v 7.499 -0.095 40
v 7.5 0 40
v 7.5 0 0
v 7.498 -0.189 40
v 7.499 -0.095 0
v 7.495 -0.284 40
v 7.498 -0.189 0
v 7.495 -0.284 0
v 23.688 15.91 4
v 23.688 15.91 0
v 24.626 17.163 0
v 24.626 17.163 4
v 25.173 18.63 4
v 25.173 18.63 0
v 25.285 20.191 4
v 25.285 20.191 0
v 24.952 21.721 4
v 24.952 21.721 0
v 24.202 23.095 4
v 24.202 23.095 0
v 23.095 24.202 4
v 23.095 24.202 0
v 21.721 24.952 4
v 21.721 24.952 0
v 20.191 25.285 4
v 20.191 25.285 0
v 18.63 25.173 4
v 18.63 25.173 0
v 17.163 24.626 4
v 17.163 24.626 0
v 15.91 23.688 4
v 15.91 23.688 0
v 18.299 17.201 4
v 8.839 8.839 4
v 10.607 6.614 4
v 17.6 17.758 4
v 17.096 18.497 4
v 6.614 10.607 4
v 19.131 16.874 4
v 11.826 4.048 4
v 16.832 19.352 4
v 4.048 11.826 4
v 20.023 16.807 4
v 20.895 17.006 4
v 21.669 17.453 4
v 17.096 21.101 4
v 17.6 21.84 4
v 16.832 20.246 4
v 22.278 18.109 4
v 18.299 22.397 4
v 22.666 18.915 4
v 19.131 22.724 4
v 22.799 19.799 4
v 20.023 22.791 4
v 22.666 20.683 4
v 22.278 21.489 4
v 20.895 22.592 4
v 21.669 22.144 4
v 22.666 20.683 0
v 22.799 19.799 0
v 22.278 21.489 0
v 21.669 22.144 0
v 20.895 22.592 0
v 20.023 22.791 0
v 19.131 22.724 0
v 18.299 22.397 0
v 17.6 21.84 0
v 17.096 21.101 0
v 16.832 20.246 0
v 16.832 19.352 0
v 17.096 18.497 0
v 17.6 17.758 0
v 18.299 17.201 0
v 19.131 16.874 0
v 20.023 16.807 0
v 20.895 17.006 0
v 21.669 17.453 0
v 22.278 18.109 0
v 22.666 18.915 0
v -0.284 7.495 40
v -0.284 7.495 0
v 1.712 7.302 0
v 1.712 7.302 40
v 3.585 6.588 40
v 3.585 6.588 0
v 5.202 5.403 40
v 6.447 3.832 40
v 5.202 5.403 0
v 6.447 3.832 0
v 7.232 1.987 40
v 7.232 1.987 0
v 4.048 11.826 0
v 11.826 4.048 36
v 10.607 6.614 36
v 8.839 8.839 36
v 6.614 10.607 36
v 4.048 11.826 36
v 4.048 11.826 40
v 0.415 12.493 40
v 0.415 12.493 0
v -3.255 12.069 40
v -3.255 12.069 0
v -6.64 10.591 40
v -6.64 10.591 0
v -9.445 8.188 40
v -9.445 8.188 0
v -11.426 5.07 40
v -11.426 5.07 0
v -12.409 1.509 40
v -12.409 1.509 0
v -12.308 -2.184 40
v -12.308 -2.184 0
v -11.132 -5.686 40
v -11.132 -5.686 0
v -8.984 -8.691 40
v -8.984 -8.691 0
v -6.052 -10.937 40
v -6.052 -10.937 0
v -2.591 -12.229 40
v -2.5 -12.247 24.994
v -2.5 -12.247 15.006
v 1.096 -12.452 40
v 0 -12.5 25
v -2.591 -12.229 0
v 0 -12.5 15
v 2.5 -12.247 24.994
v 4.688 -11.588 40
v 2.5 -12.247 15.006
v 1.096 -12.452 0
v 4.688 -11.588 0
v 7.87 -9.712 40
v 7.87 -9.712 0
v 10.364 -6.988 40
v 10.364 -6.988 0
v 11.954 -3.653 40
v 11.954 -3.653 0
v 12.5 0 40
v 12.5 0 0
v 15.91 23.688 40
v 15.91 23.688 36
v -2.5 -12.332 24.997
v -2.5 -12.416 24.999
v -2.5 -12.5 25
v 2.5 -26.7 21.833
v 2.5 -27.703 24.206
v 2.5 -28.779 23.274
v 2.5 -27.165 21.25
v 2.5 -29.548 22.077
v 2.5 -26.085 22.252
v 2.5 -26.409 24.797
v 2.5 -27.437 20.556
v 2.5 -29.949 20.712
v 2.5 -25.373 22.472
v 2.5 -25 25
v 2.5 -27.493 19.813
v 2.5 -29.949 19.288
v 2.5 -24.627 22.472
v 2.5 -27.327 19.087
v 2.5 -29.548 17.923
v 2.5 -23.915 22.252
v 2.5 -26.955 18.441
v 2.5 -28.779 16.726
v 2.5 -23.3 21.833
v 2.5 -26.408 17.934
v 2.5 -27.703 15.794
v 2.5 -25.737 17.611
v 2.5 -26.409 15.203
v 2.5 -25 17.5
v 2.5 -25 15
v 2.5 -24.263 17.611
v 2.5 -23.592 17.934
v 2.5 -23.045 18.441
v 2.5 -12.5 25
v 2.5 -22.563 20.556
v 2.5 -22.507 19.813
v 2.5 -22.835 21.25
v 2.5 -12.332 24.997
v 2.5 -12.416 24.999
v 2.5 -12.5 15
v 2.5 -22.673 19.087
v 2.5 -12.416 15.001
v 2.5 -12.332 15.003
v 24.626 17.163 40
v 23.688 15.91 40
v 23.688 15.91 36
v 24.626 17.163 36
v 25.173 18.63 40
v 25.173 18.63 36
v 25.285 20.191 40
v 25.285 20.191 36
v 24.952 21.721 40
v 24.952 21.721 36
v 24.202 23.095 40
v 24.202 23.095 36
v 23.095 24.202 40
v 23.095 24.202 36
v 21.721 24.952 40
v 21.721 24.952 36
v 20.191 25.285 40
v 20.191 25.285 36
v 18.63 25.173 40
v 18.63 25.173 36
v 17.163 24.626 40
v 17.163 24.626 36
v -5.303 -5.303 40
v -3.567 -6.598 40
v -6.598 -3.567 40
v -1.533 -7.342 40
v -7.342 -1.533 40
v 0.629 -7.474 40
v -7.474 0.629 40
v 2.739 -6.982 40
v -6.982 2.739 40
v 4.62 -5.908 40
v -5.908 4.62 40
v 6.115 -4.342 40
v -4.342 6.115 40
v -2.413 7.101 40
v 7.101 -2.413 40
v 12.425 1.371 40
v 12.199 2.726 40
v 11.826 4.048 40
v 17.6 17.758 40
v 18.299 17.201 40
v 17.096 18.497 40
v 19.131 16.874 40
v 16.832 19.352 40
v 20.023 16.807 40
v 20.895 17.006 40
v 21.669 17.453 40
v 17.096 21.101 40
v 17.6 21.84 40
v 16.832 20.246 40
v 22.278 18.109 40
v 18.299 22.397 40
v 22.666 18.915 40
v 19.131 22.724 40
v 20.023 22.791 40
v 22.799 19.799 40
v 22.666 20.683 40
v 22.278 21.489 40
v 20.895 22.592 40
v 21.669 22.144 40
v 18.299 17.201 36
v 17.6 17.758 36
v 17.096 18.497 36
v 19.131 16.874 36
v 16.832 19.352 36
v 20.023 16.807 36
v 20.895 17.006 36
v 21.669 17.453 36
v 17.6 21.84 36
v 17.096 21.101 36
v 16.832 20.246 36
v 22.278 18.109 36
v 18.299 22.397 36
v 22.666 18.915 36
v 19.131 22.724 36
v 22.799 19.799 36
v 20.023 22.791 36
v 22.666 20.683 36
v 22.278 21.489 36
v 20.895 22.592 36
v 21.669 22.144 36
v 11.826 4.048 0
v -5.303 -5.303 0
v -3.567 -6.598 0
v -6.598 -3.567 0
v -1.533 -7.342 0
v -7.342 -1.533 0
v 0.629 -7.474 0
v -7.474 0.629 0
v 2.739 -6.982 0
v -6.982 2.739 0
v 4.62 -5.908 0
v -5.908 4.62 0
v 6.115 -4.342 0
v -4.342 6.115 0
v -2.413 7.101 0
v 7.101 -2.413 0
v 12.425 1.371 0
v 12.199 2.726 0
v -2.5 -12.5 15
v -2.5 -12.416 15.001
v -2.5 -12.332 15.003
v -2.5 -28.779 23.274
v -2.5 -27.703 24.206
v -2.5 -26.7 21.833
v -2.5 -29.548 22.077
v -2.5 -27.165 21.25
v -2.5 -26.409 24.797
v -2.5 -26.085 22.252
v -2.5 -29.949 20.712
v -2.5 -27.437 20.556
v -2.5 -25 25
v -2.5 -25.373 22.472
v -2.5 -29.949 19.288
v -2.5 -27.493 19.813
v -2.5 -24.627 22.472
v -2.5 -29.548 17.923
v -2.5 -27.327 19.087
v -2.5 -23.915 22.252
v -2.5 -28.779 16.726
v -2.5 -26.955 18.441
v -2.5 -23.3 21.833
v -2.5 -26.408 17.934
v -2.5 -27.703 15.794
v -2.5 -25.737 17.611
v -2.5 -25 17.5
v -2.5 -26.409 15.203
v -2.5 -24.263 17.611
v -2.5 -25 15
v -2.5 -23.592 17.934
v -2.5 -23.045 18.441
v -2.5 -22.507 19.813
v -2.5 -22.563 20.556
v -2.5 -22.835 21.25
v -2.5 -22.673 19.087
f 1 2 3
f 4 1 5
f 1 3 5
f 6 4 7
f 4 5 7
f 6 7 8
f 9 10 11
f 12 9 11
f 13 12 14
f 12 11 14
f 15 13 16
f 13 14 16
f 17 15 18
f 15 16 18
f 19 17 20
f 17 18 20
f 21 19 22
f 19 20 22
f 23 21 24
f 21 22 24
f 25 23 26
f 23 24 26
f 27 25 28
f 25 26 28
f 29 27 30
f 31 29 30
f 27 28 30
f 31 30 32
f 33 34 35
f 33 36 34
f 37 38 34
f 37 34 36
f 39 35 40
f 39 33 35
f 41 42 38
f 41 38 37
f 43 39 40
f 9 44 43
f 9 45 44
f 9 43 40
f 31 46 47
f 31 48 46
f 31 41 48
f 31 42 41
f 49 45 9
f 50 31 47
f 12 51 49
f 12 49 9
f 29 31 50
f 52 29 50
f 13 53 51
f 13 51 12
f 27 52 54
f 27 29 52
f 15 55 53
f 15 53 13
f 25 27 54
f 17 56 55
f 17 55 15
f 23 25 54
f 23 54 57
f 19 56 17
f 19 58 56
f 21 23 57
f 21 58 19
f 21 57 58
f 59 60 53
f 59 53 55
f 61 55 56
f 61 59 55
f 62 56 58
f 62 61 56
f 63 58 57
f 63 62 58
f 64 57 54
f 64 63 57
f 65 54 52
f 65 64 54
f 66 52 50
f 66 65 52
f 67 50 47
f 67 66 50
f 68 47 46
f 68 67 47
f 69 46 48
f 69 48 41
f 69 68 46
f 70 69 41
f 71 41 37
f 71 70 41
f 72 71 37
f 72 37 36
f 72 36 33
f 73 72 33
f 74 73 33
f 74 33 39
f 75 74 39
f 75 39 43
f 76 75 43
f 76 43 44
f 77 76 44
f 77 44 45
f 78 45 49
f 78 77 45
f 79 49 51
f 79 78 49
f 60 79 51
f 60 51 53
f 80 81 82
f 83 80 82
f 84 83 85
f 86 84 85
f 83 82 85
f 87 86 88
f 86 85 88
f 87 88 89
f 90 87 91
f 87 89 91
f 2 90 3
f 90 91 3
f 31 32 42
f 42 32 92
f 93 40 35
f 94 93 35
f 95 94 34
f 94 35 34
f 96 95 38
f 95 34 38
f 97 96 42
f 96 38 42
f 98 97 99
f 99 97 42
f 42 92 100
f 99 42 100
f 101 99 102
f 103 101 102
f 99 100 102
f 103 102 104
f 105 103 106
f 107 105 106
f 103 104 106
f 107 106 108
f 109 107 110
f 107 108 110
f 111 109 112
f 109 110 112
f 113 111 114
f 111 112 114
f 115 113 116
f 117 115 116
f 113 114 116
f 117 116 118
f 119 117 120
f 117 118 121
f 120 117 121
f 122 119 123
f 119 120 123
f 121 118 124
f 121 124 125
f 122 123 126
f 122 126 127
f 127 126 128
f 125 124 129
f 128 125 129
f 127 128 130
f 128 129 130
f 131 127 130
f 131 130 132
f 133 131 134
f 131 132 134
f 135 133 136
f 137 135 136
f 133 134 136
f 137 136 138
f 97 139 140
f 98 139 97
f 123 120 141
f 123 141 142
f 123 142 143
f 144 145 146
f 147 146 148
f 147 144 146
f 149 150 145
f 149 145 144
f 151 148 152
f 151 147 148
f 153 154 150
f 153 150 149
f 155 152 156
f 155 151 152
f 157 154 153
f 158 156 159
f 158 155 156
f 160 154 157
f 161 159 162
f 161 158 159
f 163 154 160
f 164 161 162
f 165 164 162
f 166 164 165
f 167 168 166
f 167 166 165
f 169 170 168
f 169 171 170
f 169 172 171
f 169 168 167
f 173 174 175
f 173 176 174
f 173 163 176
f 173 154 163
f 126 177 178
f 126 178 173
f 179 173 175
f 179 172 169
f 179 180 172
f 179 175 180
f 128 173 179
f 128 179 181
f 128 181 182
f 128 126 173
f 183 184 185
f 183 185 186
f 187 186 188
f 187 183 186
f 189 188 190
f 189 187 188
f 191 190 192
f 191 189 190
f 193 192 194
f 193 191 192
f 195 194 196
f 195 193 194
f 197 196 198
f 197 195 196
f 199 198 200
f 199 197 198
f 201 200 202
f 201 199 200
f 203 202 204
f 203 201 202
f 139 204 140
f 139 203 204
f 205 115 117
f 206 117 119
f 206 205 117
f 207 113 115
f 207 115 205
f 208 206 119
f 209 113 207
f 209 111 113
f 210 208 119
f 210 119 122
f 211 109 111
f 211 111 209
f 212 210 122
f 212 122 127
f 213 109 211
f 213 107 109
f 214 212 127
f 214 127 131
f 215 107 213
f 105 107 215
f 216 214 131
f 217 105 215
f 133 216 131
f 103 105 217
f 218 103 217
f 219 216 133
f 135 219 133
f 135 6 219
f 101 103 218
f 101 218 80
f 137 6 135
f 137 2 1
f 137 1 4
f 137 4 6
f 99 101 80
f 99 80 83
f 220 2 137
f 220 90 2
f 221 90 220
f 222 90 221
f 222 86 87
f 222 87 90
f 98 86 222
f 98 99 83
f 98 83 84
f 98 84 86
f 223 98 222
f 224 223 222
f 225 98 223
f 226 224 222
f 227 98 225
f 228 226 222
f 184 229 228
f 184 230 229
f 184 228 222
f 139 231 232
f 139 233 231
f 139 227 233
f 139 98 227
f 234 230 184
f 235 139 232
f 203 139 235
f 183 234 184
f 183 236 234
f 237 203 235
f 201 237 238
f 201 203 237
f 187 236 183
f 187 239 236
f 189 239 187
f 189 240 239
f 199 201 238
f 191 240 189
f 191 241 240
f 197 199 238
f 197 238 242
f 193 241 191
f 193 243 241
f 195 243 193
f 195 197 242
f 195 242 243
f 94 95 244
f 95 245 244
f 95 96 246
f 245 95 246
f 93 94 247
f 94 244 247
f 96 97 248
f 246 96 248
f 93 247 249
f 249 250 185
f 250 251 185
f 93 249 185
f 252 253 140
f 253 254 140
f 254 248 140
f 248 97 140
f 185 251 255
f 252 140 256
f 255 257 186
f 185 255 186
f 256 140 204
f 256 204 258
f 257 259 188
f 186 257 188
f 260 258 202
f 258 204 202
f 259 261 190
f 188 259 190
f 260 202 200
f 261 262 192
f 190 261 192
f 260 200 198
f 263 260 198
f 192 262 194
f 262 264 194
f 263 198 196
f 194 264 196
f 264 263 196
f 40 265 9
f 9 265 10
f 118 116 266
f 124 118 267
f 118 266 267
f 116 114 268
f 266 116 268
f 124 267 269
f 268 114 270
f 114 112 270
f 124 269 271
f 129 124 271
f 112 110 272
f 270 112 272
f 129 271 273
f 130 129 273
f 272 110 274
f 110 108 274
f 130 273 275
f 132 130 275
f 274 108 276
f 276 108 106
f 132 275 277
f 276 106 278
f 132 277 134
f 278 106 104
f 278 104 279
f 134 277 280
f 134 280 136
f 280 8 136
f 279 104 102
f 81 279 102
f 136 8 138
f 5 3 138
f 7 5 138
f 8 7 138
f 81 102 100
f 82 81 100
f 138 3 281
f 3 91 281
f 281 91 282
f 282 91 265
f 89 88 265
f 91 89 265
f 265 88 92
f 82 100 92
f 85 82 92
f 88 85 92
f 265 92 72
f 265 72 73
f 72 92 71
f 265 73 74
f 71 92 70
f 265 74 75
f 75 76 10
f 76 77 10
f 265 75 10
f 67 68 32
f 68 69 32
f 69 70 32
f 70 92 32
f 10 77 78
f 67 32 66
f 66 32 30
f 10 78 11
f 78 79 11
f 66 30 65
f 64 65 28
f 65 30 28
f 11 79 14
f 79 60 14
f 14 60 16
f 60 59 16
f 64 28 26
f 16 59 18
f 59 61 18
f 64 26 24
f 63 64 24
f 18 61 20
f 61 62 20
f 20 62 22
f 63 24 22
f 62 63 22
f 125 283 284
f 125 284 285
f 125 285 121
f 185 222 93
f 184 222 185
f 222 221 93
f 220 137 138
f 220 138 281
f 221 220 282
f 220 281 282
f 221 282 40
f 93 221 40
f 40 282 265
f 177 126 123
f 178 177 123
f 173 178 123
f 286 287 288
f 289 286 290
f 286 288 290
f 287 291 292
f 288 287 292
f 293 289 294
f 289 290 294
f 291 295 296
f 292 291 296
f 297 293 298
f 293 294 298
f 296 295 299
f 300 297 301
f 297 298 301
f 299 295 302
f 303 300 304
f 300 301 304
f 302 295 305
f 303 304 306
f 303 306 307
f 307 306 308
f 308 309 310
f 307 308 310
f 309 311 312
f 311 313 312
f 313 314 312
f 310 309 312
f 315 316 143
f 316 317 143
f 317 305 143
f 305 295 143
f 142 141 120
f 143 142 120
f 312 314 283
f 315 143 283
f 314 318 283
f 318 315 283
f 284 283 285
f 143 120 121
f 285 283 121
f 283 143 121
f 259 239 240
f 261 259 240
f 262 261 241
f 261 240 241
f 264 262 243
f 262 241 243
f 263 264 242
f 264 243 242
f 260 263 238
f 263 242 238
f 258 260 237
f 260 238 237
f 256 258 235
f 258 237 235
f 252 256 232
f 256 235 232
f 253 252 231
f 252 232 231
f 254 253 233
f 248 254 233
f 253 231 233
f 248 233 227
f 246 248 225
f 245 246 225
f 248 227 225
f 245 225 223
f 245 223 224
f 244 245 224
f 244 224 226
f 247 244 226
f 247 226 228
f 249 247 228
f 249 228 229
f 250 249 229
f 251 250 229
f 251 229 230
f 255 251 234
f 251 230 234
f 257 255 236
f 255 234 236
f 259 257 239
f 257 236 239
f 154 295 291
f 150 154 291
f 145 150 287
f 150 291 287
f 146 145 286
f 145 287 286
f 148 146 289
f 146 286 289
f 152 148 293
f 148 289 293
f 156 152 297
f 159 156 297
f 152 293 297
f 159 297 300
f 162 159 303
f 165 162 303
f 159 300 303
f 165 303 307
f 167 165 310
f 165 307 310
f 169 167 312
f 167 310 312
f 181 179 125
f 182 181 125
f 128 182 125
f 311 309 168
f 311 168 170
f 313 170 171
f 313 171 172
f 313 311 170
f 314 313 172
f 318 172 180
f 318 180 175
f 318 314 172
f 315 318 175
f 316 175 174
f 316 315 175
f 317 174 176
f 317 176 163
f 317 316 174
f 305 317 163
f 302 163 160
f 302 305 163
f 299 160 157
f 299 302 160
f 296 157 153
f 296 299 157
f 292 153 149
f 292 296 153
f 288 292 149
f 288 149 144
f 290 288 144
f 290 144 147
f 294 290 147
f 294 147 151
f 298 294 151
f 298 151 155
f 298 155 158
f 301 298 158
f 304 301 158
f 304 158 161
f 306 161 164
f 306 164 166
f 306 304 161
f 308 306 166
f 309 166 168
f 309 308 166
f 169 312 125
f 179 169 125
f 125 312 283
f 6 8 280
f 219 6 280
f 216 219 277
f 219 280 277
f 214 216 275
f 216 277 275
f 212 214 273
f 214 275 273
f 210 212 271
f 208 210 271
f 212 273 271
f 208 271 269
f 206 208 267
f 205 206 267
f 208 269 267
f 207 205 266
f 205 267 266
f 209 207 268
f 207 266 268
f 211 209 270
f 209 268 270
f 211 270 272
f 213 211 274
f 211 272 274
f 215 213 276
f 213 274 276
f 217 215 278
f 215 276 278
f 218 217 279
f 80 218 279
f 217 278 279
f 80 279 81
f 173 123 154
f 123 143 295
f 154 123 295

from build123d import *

# Parameters (mm, degrees)
SKETCH_1_R           = 12.5
SKETCH_1_R_2         = 7.5
EXTRUDE_1_DEPTH      = 40
SKETCH_1_4_R         = 3
EXTRUDE_3_DEPTH      = 4
EXTRUDE_4_DEPTH      = 2.5
EXTRUDE_4_DEPTH_BACK = 2.5
SKETCH_2_R           = 2.5


with BuildPart() as part:
    # Эскиз1 → Бобышка-Вытянуть1 (new body)
    with BuildSketch(Plane.XY):
        Circle(SKETCH_1_R)
        Circle(SKETCH_1_R_2, mode=Mode.SUBTRACT)
    extrude(amount=EXTRUDE_1_DEPTH)

    # Эскиз1<4> → Бобышка-Вытянуть3 (add)
    with BuildSketch(Plane.XY):
        with BuildLine():
            Line((15.909902577, 23.68807717), (4.048166637, 11.82634123))
            ThreePointArc((4.048166637, 11.82634123), (8.838834765, 8.838834765), (11.82634123, 4.048166637))
            Line((11.82634123, 4.048166637), (23.68807717, 15.909902577))
            ThreePointArc((23.68807717, 15.909902577), (23.68807717, 23.68807717), (15.909902577, 23.68807717))
        make_face()
        with Locations((19.798989873, 19.798989873)):
            Circle(SKETCH_1_4_R, mode=Mode.SUBTRACT)
    extrude_3 = extrude(amount=EXTRUDE_3_DEPTH)

    # Зеркальное отражение1: Бобышка-Вытянуть3 across plane
    add(extrude_3.mirror(Plane.XY.offset(20)))

    # Эскиз2 → Бобышка-Вытянуть4 (add, two sides: drawn at the far end of the back side and taken through both)
    with BuildSketch(Plane(origin=(0, 0, 0), x_dir=(0, 0, -1), z_dir=(1, 0, 0)).offset(-EXTRUDE_4_DEPTH_BACK)):
        with BuildLine():
            Line((-25, -12.5), (-25, -25))
            ThreePointArc((-25, -25), (-20, -30), (-15, -25))
            Line((-15, -25), (-15, -12.5))
            ThreePointArc((-15, -12.5), (-15.105468435, -11.478451782), (-15.417424305, -10.5))
            Line((-15.417424305, -10.5), (-24.582575695, -10.5))
            ThreePointArc((-24.582575695, -10.5), (-24.894531565, -11.478451782), (-25, -12.5))
        make_face()
        with Locations((-20, -25)):
            Circle(SKETCH_2_R, mode=Mode.SUBTRACT)
    extrude(amount=EXTRUDE_4_DEPTH + EXTRUDE_4_DEPTH_BACK)


solid = part.part
